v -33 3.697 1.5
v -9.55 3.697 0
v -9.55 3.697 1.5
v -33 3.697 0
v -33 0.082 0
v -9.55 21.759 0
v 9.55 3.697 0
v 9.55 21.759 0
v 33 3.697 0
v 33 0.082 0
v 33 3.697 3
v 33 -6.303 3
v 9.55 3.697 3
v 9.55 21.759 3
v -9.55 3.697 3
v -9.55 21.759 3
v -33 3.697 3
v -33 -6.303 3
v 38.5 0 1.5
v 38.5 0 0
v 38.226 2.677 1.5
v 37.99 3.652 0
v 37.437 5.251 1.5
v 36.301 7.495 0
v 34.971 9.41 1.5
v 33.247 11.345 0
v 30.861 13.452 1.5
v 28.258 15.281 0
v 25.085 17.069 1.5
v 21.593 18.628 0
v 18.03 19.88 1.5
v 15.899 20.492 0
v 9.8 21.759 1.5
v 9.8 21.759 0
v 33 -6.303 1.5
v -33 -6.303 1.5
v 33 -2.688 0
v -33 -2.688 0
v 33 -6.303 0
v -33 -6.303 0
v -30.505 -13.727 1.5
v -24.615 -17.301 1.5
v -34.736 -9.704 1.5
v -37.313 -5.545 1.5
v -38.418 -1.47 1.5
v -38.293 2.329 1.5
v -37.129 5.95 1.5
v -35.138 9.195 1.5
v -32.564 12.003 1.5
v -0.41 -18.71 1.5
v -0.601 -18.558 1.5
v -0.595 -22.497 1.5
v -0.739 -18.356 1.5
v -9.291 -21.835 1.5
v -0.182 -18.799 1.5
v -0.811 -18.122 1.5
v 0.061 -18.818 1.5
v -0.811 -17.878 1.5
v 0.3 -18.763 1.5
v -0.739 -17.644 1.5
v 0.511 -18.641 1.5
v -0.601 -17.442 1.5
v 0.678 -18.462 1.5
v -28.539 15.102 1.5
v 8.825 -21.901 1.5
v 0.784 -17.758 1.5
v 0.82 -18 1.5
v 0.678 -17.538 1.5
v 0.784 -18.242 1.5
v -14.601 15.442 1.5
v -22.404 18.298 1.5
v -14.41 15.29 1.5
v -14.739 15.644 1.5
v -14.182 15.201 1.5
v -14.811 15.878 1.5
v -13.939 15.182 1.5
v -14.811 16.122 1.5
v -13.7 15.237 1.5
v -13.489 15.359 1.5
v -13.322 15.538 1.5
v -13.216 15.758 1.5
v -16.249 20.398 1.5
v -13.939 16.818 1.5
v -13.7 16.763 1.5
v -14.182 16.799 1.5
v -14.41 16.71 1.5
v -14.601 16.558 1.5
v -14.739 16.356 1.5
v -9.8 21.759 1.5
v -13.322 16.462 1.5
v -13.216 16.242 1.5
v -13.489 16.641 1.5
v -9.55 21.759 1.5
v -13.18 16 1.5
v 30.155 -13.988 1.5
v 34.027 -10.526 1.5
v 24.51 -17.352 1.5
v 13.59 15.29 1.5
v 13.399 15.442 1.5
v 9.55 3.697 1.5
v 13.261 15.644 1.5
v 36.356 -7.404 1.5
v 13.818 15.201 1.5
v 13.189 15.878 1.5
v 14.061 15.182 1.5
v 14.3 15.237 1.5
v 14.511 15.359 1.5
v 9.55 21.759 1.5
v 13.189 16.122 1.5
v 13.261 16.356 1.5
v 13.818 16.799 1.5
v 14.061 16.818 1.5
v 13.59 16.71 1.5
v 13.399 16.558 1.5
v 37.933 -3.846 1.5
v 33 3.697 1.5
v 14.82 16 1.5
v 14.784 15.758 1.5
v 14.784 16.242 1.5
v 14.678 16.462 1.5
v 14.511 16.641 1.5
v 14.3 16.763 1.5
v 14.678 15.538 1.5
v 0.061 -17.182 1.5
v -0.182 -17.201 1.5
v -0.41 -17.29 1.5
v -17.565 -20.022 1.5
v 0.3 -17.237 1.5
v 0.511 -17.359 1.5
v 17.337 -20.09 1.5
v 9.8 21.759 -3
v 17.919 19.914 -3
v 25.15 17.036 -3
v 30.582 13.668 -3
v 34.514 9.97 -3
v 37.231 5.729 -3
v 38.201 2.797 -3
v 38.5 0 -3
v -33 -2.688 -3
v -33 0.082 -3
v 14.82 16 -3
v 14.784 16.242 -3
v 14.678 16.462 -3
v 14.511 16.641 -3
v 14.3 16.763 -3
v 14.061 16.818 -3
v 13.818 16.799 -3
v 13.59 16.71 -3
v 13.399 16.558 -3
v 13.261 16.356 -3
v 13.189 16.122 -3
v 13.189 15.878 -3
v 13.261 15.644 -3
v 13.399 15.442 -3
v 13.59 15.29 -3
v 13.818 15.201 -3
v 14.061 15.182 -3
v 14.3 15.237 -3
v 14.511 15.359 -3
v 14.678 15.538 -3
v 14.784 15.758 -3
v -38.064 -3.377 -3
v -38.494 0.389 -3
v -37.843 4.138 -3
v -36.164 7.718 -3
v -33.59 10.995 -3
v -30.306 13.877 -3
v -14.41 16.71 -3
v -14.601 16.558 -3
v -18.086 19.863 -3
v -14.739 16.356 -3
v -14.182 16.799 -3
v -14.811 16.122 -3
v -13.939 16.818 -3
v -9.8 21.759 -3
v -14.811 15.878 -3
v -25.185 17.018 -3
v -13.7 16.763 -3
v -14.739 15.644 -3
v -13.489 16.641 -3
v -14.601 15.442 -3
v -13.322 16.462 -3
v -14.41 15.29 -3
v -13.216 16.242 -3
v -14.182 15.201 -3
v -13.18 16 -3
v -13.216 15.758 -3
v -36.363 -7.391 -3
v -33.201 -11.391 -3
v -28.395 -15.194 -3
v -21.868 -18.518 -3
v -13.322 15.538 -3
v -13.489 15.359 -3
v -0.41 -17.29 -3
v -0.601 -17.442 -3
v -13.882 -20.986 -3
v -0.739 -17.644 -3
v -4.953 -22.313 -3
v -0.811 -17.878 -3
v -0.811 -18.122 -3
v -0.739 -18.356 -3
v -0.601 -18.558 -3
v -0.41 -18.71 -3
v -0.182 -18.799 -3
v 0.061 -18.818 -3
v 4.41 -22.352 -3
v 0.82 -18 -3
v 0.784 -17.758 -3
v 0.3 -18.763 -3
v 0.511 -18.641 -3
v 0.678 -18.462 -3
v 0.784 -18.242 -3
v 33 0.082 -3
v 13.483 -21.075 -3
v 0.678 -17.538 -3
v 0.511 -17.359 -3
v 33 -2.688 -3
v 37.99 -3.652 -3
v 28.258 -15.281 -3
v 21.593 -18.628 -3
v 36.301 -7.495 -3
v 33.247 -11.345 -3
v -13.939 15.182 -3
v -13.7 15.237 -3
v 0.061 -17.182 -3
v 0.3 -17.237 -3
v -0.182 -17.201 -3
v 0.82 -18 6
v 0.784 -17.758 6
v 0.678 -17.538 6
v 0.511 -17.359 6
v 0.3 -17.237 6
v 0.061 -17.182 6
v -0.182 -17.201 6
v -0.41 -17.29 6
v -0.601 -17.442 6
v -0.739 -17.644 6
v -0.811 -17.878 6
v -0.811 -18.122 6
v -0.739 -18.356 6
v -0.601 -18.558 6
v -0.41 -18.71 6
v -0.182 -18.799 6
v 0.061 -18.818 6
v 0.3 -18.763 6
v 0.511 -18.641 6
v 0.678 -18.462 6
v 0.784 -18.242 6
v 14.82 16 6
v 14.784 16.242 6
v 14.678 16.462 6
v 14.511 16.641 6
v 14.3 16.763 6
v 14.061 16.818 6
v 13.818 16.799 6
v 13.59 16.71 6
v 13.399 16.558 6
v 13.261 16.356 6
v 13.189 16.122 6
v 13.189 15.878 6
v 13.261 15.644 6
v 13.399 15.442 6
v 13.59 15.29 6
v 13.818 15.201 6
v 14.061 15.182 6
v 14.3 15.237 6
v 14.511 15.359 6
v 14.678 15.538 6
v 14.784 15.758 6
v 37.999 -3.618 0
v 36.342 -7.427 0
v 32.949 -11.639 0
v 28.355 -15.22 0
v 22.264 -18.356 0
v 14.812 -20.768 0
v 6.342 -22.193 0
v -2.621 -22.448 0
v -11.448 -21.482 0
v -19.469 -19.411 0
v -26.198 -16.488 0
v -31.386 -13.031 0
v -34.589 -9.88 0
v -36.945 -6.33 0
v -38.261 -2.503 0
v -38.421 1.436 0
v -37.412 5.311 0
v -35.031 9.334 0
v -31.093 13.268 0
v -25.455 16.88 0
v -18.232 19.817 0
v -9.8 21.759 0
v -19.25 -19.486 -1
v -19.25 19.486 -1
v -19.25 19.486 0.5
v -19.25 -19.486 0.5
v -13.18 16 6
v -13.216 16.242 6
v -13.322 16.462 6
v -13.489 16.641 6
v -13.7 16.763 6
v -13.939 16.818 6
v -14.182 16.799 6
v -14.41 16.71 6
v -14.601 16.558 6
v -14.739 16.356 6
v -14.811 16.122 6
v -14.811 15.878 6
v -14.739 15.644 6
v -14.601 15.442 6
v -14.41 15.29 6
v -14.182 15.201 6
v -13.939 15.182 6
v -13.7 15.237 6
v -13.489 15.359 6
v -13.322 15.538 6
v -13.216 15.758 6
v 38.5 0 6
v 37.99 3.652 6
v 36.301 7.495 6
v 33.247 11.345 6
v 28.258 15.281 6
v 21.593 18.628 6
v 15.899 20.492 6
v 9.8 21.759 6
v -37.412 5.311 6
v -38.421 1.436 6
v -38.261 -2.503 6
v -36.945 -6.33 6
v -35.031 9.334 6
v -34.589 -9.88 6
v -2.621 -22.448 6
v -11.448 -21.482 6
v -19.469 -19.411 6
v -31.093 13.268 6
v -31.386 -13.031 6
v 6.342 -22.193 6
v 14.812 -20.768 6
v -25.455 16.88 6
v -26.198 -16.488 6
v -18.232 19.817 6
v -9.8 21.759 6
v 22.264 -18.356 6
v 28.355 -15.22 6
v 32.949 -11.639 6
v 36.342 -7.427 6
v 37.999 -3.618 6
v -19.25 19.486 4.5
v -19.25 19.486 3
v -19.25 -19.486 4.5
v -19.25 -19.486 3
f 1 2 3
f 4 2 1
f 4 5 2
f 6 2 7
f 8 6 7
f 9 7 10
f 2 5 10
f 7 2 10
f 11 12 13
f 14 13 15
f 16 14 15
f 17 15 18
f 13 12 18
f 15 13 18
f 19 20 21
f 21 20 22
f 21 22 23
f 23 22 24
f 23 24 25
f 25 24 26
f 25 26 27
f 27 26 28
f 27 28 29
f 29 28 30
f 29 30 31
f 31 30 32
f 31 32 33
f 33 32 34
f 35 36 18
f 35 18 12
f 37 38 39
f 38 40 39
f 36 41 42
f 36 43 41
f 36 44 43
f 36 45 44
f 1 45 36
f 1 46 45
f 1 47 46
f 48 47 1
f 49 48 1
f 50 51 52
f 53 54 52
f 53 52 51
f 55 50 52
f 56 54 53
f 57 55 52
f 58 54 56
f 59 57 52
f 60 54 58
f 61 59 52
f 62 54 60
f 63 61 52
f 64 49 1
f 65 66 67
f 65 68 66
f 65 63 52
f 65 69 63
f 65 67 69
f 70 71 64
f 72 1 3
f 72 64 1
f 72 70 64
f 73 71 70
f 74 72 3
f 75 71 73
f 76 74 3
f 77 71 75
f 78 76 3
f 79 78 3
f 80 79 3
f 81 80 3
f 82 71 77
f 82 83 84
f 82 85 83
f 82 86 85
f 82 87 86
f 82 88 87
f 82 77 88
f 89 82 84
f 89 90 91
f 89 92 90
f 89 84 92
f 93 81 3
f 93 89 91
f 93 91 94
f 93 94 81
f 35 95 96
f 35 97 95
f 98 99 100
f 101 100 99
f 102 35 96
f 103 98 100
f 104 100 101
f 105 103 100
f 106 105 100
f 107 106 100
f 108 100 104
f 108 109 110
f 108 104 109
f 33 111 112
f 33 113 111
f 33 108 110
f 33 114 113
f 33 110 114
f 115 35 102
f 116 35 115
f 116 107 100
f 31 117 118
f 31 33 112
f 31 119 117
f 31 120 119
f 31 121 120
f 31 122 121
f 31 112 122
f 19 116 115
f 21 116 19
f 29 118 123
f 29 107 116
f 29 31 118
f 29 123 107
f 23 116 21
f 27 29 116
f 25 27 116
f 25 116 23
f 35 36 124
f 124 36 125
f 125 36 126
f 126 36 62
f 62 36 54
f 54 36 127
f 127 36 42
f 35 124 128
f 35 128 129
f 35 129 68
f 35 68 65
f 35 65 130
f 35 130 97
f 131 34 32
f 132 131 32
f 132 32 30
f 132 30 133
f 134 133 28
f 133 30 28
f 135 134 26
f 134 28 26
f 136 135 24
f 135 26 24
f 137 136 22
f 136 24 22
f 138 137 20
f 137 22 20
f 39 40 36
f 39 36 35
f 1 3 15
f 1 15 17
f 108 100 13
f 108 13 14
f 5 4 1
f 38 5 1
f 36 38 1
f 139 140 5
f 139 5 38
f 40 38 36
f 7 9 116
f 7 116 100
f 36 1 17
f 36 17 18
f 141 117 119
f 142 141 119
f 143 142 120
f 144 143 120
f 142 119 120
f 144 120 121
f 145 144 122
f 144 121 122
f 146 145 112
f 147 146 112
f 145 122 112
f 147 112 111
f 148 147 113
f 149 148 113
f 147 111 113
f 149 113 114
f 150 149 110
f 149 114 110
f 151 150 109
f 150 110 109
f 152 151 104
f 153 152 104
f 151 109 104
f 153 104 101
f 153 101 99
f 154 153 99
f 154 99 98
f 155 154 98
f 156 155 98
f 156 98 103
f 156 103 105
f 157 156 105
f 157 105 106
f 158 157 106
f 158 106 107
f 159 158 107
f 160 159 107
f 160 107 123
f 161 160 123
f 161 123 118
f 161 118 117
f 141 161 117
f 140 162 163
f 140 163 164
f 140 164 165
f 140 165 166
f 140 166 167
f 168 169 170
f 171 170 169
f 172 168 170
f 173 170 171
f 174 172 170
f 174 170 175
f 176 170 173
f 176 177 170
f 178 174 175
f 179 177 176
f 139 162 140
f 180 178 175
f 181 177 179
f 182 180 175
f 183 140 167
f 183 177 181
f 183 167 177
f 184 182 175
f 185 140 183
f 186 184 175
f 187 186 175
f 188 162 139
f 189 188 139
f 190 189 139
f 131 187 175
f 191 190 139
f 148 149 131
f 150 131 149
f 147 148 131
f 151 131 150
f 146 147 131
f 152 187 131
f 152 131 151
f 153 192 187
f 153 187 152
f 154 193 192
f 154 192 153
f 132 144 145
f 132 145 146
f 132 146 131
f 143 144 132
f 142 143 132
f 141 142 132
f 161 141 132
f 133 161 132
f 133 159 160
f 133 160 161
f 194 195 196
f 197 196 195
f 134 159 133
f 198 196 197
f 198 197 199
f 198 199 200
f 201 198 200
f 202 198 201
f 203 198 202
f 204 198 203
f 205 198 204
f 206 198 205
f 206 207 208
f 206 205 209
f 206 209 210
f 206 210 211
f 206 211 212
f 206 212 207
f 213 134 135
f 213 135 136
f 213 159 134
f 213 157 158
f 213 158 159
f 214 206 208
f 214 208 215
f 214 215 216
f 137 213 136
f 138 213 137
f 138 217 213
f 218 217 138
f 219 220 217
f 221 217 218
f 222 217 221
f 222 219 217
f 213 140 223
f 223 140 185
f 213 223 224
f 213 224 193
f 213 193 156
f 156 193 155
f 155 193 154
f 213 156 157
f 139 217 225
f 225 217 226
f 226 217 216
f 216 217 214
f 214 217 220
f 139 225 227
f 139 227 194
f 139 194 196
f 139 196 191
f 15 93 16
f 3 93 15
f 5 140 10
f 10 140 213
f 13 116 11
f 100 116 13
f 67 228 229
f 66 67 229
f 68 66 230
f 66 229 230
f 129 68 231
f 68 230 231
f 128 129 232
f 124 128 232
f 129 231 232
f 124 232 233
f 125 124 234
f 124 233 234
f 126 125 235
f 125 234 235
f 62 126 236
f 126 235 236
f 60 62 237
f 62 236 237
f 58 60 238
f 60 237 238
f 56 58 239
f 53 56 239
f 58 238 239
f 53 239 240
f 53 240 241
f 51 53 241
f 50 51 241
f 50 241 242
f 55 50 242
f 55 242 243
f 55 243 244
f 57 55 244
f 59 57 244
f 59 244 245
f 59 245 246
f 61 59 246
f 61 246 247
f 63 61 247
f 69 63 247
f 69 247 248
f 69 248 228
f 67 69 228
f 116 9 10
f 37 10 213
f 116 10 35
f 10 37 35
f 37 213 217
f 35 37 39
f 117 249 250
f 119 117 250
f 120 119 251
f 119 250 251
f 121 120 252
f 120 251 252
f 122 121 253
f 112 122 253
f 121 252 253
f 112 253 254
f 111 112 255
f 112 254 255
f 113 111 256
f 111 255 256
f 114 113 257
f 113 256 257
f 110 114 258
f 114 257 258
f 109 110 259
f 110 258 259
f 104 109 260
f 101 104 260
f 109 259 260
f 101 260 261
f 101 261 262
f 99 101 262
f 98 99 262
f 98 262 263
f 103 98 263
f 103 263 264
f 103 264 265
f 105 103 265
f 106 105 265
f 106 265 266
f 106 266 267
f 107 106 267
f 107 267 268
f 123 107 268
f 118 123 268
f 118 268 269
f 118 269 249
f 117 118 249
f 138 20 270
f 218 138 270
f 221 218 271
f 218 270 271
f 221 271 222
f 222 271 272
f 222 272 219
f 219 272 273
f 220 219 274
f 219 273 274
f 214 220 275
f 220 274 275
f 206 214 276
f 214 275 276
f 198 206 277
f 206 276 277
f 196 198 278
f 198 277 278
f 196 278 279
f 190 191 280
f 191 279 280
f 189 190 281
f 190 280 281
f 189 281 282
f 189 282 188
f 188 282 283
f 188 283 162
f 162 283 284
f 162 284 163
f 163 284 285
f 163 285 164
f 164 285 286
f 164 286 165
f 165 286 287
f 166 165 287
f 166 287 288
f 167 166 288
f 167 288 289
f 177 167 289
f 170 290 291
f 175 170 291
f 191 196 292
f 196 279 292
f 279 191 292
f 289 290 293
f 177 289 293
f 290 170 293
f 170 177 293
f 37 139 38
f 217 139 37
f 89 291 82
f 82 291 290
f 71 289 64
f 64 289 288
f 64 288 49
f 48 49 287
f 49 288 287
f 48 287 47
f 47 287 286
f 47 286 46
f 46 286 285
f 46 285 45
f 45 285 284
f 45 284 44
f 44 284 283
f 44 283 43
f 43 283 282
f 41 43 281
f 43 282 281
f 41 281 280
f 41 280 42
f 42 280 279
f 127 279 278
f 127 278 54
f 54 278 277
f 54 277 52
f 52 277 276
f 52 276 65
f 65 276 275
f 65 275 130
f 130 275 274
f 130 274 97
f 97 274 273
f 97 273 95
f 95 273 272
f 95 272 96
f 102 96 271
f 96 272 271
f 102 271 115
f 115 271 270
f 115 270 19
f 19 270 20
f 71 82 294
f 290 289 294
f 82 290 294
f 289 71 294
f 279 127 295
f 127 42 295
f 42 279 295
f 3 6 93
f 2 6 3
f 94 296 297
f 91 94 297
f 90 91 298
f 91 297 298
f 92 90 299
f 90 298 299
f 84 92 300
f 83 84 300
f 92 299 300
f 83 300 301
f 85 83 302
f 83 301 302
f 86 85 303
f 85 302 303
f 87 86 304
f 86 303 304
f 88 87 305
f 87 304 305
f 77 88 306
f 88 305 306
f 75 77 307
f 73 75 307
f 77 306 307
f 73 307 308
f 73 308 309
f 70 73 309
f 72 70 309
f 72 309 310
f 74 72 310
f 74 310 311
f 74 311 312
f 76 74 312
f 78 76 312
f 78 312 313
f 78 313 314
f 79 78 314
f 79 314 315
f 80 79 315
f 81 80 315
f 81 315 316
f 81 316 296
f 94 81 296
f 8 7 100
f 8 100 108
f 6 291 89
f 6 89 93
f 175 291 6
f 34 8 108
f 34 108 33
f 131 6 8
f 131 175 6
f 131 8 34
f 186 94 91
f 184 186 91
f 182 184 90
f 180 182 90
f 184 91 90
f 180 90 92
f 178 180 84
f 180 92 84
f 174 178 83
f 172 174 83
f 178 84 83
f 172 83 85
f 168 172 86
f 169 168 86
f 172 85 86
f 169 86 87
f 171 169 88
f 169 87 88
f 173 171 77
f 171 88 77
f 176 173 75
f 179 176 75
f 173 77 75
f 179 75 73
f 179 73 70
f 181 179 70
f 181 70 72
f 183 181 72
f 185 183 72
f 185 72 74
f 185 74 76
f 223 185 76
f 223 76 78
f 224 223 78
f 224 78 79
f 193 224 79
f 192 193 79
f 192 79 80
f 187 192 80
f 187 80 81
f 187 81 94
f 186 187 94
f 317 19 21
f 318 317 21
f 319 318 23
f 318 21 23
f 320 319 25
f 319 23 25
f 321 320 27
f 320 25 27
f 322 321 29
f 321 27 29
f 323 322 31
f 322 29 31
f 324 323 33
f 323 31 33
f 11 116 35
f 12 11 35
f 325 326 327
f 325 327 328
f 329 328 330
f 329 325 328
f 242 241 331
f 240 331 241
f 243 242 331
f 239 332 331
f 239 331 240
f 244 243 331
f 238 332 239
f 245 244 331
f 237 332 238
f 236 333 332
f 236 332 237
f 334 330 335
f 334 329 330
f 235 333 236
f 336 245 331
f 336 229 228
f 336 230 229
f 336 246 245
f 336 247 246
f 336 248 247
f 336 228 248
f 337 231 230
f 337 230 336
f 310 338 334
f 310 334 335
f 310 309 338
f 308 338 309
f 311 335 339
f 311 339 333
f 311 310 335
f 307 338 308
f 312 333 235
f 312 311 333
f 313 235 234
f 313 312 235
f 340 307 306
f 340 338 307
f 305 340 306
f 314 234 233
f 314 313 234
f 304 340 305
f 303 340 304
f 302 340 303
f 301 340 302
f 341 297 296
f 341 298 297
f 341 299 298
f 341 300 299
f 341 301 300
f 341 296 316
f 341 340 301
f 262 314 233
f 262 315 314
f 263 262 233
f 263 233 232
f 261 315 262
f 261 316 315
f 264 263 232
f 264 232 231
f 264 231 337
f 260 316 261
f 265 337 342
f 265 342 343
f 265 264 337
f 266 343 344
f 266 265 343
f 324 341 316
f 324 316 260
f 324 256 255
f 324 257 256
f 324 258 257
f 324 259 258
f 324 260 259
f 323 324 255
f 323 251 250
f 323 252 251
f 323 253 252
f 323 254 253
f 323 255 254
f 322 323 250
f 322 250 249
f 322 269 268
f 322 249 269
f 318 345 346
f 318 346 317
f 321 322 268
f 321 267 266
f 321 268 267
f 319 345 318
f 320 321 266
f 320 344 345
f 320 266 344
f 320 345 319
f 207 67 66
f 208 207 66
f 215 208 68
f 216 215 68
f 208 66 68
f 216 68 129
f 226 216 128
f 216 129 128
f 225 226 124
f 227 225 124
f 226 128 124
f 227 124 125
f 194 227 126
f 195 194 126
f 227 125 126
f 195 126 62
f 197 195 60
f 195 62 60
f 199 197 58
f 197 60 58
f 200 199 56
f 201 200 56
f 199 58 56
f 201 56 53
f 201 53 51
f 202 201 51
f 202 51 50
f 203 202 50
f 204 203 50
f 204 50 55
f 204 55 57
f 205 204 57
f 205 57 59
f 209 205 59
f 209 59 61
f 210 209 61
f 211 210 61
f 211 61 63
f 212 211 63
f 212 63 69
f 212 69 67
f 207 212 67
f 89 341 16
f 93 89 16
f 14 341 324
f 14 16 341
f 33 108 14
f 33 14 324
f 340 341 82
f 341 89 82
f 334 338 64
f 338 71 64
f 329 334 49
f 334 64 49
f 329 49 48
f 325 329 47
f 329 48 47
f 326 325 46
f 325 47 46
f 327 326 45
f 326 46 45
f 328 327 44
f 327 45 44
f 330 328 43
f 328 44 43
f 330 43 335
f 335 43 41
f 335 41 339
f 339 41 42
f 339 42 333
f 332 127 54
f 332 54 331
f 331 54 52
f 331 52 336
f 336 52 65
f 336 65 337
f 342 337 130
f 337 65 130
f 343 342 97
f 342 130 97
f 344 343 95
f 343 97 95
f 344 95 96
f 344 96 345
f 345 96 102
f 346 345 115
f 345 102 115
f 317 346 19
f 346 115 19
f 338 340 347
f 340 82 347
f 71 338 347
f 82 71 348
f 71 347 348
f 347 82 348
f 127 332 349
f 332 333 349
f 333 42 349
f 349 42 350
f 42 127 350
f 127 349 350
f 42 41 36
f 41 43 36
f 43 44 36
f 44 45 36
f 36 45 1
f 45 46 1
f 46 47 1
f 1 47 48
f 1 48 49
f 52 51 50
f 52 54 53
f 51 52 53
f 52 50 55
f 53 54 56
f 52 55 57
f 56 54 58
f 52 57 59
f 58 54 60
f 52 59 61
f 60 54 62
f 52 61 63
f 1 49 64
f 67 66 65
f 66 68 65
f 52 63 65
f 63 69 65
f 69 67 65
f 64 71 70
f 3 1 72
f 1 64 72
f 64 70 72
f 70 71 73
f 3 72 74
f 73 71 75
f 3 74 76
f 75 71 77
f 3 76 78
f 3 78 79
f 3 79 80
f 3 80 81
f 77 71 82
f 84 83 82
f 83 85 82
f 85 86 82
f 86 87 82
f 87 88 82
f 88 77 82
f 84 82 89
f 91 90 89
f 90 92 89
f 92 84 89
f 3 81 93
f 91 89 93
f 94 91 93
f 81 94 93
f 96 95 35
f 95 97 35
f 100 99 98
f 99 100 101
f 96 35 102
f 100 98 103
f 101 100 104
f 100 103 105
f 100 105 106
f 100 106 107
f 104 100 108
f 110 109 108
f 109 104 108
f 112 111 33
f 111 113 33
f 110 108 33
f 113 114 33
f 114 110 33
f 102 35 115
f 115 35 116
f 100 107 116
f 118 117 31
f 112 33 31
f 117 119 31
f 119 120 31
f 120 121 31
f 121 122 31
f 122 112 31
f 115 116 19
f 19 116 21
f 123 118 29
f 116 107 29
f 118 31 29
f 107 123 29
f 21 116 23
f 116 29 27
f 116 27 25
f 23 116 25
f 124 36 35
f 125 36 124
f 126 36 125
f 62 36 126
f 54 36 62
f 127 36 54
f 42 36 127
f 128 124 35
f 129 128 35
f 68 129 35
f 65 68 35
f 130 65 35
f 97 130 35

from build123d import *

# Parameters (mm, degrees)
BOX_BOTTOM_HALF_0_W     = 78.999568
BOX_BOTTOM_HALF_0_H     = 46.255487
BOX_BOTTOM_HALF_0_DEPTH = 5.5
PAD_DEPTH               = 6
POCKET_DEPTH            = 3
PAD001_DEPTH            = 3
SKETCH003_W             = 66
SKETCH003_H             = 2.77
POCKET001_DEPTH         = 3
SKETCH004_W             = 19.6
SKETCH004_H             = 1
POCKET002_DEPTH         = 9.001
SKETCH005_R             = 0.82
POCKET003_DEPTH         = 9.001


with BuildPart() as box_bottom_half_0_body:
    # box_bottom_half_0 → box_bottom_half_0 (new body)
    with BuildSketch(Plane(origin=(-39.499568, -23.496619, -4), x_dir=(1, 0, 0), z_dir=(0, 0, 1))):
        with Locations((39.499784, 23.127743)):
            Rectangle(BOX_BOTTOM_HALF_0_W, BOX_BOTTOM_HALF_0_H)
    extrude(amount=BOX_BOTTOM_HALF_0_DEPTH)


with BuildPart() as body:
    # Sketch → Pad (new body)
    with BuildSketch(Plane.XY):
        with BuildLine():
            add(Edge.make_bspline(
                [(38.5, 0), (38.5, 38.971143), (-19.25, 19.485572), (-77, 0), (-19.25, -19.485572), (38.5, -38.971143), (38.5, 0)],
                knots=[0, 0, 0, 2.094395, 2.094395, 4.18879, 4.18879, 6.283185, 6.283185, 6.283185], degree=2, weights=[1, 0.5, 1, 0.5, 1, 0.5, 1]))
        make_face()
    extrude(amount=PAD_DEPTH)

    # Sketch001 (on Face2 of Pad) → Pocket (cut)
    with BuildSketch(Plane(origin=(0, 0, 0), x_dir=(1, 0, 0), z_dir=(0, 0, -1))):
        Polygon((9.55, -3.696801), (9.55, -21.796801), (-9.55, -21.796801), (-9.55, -3.696801), (-33, -3.696801), (-33, 6.303199), (33, 6.303199), (33, -3.696801), align=None)
    extrude(amount=-POCKET_DEPTH, mode=Mode.SUBTRACT)

    # Sketch002 (on Face2 of Pocket) → Pad001 (join)
    with BuildSketch(Plane(origin=(0, 0, 0), x_dir=(1, 0, 0), z_dir=(0, 0, -1))):
        with BuildLine():
            add(Edge.make_bspline(
                [(38.5, 0), (38.5, 38.971143), (-19.25, 19.485572), (-77, 0), (-19.25, -19.485572), (38.5, -38.971143), (38.5, 0)],
                knots=[0, 0, 0, 2.094395, 2.094395, 4.18879, 4.18879, 6.283185, 6.283185, 6.283185], degree=2, weights=[1, 0.5, 1, 0.5, 1, 0.5, 1]))
        make_face()
    extrude(amount=PAD001_DEPTH)

    # Sketch003 (on Face4 of Pad001) → Pocket001 (cut)
    with BuildSketch(Plane(origin=(0, 0, -3), x_dir=(1, 0, 0), z_dir=(0, 0, -1))):
        with Locations((0, 1.303199)):
            Rectangle(SKETCH003_W, SKETCH003_H)
    extrude(amount=-POCKET001_DEPTH, mode=Mode.SUBTRACT)

    # Sketch004 (on Face4 of Pocket001) → Pocket002 (cut, through all)
    with BuildSketch(Plane(origin=(0, 0, -3), x_dir=(1, 0, 0), z_dir=(0, 0, -1))):
        with Locations((0, -22.258868)):
            Rectangle(SKETCH004_W, SKETCH004_H)
    extrude(amount=-POCKET002_DEPTH, mode=Mode.SUBTRACT)

    # Sketch005 (on Face4 of Pocket002) → Pocket003 (cut, through all)
    with BuildSketch(Plane.XY.offset(6)):
        with Locations((-14, 16)):
            Circle(SKETCH005_R)
        with Locations((14, 16)):
            Circle(SKETCH005_R)
        with Locations((0, -18)):
            Circle(SKETCH005_R)
    extrude(amount=-POCKET003_DEPTH, mode=Mode.SUBTRACT)


with BuildPart() as bottom_half_0_body:
    # bottom_half_0 base: copy of Body
    add(body.part)

    # bottom_half_0: intersect box_bottom_half_0 body
    add(box_bottom_half_0_body.part, mode=Mode.INTERSECT)


with BuildPart() as top_half_0_body:
    # top_half_0 base: copy of Body
    add(body.part)

    # top_half_0: cut box_bottom_half_0 body
    add(box_bottom_half_0_body.part, mode=Mode.SUBTRACT)


solid = Compound([bottom_half_0_body.part, top_half_0_body.part])
